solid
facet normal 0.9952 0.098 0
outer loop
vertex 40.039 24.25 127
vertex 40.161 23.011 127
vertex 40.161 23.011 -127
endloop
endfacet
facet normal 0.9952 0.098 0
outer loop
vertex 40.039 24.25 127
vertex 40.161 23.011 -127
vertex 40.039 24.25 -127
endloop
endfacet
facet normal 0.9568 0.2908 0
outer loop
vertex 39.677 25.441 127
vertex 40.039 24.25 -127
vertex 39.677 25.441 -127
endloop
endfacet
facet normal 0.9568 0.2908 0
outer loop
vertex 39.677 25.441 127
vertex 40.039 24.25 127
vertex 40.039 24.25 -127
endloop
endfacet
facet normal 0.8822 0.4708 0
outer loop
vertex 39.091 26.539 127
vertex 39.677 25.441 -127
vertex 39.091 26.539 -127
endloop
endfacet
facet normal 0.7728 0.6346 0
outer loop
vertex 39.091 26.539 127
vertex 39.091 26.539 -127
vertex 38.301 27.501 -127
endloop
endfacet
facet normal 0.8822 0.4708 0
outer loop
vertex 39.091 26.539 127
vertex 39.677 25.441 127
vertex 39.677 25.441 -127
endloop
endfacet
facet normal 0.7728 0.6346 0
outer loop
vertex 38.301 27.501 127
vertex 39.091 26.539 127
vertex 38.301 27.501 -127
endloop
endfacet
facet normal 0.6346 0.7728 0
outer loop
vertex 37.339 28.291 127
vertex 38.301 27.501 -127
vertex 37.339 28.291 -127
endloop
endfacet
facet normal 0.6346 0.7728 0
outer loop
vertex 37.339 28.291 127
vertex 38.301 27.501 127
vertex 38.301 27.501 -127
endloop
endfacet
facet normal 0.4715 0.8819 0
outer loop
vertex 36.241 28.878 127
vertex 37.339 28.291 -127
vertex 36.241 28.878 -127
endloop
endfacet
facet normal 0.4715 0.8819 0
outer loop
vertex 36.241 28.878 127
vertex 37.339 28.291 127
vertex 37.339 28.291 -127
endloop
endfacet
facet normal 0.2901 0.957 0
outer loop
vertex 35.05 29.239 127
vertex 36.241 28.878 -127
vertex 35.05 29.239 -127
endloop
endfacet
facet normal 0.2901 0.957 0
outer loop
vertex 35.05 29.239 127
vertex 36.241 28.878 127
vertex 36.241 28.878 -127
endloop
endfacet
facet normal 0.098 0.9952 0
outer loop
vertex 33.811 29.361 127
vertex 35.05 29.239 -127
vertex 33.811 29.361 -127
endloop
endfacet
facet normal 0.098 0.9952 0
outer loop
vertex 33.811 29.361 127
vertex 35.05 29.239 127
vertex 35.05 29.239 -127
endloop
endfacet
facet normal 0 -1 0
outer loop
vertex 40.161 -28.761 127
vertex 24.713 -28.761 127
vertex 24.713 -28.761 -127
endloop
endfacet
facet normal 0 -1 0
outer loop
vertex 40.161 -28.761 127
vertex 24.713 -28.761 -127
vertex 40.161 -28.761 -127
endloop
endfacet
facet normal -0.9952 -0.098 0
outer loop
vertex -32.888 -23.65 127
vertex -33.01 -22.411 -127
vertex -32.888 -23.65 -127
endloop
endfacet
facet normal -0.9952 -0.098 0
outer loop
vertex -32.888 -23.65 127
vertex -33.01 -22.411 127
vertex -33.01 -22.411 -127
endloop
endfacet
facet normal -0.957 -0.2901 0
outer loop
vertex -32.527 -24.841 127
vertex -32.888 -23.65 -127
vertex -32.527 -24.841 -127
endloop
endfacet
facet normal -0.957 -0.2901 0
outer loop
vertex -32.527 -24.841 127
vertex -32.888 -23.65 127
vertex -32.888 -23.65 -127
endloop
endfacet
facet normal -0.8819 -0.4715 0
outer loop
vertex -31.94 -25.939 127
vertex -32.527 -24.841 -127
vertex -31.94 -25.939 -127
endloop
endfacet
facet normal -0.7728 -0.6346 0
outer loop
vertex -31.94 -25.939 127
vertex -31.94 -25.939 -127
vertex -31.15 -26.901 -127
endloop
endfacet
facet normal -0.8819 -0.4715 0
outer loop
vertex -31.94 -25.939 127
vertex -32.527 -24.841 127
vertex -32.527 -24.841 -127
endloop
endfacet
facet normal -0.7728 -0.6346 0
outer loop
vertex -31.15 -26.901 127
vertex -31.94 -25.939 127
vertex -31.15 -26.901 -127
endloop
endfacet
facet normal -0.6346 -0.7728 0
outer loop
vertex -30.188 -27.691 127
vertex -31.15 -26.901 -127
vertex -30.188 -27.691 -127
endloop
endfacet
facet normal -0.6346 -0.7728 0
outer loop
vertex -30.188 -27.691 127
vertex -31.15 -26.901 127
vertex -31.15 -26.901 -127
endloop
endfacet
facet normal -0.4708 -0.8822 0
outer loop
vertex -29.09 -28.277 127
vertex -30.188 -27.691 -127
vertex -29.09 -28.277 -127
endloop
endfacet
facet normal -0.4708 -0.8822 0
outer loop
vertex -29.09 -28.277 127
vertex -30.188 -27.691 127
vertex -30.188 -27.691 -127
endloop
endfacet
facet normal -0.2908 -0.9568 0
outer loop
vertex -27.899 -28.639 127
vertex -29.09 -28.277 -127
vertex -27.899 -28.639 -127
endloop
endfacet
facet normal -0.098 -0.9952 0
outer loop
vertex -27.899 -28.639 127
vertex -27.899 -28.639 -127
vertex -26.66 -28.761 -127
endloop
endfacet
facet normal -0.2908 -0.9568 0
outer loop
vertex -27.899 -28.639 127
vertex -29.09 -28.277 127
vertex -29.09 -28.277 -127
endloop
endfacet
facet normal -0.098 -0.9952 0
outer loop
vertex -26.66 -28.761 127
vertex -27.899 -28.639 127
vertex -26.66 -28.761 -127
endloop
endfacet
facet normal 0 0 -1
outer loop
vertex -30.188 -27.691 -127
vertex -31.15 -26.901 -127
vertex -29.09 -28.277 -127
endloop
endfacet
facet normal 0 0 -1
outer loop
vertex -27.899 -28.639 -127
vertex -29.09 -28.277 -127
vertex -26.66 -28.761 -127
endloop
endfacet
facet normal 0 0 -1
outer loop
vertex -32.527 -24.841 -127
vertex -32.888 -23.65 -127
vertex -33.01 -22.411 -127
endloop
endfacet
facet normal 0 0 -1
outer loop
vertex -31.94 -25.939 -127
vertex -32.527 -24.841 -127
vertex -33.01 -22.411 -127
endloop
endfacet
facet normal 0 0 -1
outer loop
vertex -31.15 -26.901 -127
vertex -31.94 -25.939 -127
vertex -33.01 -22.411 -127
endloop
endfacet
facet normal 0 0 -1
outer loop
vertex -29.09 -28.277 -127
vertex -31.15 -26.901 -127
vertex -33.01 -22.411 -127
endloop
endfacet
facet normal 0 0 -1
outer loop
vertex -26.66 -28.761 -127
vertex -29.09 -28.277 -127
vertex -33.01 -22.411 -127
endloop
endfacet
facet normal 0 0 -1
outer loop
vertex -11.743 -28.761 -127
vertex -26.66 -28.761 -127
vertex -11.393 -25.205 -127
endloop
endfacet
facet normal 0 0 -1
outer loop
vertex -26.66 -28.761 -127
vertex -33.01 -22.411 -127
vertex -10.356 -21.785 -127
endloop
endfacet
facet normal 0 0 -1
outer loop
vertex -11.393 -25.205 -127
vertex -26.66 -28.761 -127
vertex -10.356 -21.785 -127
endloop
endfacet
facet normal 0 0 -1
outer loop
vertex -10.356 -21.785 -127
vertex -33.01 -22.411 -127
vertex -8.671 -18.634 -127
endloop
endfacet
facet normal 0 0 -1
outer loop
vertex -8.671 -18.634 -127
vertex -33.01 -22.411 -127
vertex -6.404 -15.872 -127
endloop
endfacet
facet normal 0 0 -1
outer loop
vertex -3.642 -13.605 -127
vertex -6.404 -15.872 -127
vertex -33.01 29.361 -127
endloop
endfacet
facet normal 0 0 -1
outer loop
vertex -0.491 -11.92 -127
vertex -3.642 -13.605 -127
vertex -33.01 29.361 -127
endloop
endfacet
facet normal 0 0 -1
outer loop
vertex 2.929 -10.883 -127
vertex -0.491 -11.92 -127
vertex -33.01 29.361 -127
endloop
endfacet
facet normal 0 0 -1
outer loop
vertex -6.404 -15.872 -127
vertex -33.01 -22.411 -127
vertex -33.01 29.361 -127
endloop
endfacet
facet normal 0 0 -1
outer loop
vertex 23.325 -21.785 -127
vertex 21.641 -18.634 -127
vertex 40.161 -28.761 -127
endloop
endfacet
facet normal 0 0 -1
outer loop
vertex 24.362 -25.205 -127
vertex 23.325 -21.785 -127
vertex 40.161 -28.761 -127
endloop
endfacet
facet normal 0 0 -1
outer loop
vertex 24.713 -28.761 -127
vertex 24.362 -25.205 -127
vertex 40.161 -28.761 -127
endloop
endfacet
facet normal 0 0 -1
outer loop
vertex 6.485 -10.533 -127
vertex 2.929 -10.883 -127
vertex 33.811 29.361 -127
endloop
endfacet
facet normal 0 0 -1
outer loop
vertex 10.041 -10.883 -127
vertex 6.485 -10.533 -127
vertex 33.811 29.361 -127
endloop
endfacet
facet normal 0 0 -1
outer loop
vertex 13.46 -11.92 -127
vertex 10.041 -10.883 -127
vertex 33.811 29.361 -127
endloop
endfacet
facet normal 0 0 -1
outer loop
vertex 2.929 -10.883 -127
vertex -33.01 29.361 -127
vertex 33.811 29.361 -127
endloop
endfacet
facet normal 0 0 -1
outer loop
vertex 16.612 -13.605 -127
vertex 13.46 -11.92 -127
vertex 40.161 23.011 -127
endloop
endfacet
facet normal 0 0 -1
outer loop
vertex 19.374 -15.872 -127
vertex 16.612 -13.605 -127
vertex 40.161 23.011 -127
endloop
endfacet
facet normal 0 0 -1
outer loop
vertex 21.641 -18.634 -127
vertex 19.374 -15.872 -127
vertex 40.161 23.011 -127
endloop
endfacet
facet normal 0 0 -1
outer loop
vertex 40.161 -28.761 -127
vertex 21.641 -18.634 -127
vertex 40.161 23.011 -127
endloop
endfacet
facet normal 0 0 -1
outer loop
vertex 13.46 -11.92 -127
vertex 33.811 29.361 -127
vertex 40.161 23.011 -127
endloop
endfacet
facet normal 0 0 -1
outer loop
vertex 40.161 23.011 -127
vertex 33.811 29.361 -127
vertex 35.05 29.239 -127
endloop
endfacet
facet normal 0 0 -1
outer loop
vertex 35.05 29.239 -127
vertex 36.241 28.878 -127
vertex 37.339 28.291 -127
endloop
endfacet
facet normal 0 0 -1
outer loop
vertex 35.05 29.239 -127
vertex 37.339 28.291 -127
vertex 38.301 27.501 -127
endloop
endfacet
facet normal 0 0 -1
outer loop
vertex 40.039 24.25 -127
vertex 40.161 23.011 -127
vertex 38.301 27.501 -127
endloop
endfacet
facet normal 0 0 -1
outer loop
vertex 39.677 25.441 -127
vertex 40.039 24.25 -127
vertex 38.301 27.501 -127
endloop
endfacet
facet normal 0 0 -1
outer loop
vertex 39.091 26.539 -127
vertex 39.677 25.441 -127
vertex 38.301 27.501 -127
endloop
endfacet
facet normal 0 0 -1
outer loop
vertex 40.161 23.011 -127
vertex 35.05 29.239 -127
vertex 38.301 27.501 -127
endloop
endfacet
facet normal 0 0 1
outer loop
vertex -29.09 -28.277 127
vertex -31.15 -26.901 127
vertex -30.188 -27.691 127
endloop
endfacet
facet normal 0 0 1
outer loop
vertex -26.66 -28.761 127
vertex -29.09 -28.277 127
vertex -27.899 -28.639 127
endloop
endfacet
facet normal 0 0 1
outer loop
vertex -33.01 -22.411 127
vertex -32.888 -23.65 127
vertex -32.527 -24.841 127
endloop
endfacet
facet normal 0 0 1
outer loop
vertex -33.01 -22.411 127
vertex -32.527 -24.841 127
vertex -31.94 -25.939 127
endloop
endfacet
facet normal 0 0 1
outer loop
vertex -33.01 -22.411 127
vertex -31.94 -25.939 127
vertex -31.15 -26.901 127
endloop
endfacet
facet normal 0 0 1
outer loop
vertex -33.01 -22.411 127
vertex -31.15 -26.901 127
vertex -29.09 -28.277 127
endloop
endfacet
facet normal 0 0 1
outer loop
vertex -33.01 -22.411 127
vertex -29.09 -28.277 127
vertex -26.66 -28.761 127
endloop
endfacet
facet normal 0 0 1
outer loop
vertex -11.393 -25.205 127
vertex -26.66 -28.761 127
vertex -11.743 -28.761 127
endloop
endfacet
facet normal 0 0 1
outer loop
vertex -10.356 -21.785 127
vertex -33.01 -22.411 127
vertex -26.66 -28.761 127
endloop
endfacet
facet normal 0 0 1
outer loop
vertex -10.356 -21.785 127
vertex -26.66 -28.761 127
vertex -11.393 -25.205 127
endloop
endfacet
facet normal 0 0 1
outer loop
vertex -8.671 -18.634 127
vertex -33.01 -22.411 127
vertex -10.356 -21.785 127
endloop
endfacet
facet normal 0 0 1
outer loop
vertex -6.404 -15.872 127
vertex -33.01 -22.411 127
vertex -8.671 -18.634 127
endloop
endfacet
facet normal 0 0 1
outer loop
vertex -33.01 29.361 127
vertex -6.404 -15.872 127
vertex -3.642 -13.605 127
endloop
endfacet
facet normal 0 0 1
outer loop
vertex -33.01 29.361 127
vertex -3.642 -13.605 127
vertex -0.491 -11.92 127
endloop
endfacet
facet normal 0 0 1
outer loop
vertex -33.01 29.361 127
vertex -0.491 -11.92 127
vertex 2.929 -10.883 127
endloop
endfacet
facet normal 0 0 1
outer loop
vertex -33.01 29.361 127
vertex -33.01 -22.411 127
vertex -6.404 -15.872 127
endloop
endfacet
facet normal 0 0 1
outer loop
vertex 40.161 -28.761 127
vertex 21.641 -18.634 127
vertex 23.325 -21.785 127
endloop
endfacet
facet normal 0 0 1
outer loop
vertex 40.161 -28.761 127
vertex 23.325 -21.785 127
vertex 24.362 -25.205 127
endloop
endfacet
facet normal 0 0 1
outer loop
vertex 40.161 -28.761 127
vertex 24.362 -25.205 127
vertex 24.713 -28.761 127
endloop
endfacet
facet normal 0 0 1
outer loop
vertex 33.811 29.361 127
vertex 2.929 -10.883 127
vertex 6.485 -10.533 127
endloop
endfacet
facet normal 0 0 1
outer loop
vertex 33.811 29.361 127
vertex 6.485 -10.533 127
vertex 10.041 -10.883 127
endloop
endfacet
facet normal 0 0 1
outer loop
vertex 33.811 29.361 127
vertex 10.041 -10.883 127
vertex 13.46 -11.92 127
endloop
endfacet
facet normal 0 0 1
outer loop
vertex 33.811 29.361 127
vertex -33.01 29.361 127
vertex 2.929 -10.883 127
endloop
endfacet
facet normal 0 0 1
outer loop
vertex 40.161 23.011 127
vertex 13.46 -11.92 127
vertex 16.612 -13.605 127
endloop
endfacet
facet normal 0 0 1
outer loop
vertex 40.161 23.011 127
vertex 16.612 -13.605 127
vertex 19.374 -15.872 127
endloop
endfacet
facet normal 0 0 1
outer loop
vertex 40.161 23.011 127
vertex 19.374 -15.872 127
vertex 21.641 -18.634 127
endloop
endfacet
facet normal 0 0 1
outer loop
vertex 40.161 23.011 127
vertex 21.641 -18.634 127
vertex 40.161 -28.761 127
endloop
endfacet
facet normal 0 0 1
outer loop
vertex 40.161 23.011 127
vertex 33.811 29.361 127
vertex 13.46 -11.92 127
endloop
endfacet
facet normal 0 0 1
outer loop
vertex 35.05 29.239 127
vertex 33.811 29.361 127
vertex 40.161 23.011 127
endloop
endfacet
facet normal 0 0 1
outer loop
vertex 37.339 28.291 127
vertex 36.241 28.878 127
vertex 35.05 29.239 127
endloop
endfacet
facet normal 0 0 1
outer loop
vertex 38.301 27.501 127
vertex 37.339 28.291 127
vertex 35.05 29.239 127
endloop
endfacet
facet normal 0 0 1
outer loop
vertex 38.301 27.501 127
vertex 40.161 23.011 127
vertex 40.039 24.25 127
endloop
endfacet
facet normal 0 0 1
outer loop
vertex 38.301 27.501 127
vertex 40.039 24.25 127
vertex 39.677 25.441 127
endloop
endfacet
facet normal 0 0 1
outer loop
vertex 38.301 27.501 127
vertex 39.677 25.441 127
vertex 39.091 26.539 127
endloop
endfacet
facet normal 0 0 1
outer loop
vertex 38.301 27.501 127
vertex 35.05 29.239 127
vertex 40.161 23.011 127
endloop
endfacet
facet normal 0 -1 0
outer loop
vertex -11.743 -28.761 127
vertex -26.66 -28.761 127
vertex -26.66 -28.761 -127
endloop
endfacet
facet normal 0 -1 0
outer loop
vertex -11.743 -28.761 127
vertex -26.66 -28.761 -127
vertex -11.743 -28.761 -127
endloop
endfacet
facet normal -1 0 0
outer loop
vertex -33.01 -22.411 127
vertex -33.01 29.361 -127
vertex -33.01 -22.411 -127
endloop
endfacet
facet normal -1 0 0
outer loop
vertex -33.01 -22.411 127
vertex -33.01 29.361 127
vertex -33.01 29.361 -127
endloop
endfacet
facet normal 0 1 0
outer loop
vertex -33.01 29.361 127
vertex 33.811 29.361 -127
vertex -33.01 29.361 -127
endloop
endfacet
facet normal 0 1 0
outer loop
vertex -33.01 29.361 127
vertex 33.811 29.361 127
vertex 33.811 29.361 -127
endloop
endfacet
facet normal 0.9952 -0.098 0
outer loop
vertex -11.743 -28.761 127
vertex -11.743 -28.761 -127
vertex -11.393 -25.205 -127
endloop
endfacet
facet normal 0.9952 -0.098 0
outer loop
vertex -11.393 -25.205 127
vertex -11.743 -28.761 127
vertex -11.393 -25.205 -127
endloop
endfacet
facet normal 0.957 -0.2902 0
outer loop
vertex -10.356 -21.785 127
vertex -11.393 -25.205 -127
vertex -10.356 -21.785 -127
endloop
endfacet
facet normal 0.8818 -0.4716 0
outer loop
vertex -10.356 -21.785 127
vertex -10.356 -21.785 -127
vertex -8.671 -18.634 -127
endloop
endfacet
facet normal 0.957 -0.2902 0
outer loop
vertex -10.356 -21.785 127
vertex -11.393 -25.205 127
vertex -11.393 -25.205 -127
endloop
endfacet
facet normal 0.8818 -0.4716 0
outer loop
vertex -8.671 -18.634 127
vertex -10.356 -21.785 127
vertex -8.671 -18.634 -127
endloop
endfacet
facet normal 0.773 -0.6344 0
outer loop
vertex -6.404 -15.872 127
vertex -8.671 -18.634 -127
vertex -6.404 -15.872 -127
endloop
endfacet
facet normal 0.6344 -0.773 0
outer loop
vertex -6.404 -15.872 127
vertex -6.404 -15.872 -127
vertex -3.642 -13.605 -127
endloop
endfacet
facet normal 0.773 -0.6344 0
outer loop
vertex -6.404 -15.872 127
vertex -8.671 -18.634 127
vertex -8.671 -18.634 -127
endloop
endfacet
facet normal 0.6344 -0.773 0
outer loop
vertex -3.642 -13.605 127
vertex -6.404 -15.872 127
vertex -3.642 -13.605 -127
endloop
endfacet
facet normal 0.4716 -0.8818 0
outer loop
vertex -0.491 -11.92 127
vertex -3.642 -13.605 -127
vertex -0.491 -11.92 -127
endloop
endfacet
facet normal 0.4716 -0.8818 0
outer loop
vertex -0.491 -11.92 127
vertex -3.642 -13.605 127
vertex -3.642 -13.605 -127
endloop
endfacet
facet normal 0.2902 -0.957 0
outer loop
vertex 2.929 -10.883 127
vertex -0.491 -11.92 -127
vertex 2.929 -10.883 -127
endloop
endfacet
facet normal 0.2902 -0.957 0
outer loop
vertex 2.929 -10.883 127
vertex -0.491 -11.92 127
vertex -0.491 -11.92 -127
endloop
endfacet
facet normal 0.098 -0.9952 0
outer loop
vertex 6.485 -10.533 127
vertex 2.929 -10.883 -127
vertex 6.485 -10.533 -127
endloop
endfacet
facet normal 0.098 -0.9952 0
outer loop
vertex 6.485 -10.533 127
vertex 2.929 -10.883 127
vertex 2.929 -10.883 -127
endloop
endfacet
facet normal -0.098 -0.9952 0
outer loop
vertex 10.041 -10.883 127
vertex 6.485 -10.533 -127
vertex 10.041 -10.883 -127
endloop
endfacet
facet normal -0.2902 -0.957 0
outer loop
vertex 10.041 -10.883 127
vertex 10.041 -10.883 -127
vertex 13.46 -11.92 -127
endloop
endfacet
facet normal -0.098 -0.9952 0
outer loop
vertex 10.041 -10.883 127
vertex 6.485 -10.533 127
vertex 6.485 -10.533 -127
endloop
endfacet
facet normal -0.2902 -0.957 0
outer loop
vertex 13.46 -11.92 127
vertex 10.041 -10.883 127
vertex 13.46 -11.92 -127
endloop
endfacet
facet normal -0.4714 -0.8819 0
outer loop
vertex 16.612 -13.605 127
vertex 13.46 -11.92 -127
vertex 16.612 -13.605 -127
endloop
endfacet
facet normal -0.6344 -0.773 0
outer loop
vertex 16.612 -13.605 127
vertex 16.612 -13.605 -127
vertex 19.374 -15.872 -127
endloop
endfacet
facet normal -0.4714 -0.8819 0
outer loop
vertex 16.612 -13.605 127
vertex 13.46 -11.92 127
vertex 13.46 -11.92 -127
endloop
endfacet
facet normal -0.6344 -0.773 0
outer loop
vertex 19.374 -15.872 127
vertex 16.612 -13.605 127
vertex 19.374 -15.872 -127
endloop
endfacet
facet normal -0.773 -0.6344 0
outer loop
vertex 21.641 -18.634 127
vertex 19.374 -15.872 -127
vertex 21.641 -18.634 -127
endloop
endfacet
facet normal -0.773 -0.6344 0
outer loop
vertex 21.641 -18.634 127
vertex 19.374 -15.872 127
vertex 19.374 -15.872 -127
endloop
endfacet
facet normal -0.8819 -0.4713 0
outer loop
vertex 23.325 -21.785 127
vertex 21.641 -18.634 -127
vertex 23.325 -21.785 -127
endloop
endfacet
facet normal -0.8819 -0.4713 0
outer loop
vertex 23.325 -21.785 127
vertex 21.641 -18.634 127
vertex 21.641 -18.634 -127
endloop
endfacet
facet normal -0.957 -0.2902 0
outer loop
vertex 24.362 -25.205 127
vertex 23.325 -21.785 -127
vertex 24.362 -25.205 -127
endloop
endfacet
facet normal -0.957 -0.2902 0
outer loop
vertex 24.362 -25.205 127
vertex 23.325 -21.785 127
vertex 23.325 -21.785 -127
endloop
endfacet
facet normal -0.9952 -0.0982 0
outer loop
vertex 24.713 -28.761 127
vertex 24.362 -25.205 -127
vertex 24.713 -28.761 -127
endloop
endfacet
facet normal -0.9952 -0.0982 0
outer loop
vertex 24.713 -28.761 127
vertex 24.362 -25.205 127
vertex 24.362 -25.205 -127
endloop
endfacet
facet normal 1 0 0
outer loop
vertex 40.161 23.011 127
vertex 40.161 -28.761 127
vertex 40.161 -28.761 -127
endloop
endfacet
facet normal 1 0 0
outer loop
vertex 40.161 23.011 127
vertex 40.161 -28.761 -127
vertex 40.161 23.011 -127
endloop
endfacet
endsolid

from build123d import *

# Parameters (mm, degrees)
F1_DEPTH = 127


with BuildPart() as f1:
    # F0 (on Top) → F1 (new body, symmetric)
    with BuildSketch(Plane.XY):
        with BuildLine():
            ThreePointArc((-33.009991, -22.410832), (-31.150119, -26.90096), (-26.659991, -28.760832))
            Line((-26.659991, -28.760832), (-11.74327, -28.760832))
            ThreePointArc((-11.74327, -28.760832), (6.484724, -10.532838), (24.712717, -28.760832))
            Line((24.712717, -28.760832), (40.160779, -28.760832))
            Line((40.160779, -28.760832), (40.160779, 23.01116))
            ThreePointArc((40.160779, 23.01116), (38.300907, 27.501289), (33.810779, 29.36116))
            Line((33.810779, 29.36116), (-33.009991, 29.36116))
            Line((-33.009991, 29.36116), (-33.009991, -22.410832))
        make_face()
    extrude(amount=F1_DEPTH, both=True)


solid = f1.part
